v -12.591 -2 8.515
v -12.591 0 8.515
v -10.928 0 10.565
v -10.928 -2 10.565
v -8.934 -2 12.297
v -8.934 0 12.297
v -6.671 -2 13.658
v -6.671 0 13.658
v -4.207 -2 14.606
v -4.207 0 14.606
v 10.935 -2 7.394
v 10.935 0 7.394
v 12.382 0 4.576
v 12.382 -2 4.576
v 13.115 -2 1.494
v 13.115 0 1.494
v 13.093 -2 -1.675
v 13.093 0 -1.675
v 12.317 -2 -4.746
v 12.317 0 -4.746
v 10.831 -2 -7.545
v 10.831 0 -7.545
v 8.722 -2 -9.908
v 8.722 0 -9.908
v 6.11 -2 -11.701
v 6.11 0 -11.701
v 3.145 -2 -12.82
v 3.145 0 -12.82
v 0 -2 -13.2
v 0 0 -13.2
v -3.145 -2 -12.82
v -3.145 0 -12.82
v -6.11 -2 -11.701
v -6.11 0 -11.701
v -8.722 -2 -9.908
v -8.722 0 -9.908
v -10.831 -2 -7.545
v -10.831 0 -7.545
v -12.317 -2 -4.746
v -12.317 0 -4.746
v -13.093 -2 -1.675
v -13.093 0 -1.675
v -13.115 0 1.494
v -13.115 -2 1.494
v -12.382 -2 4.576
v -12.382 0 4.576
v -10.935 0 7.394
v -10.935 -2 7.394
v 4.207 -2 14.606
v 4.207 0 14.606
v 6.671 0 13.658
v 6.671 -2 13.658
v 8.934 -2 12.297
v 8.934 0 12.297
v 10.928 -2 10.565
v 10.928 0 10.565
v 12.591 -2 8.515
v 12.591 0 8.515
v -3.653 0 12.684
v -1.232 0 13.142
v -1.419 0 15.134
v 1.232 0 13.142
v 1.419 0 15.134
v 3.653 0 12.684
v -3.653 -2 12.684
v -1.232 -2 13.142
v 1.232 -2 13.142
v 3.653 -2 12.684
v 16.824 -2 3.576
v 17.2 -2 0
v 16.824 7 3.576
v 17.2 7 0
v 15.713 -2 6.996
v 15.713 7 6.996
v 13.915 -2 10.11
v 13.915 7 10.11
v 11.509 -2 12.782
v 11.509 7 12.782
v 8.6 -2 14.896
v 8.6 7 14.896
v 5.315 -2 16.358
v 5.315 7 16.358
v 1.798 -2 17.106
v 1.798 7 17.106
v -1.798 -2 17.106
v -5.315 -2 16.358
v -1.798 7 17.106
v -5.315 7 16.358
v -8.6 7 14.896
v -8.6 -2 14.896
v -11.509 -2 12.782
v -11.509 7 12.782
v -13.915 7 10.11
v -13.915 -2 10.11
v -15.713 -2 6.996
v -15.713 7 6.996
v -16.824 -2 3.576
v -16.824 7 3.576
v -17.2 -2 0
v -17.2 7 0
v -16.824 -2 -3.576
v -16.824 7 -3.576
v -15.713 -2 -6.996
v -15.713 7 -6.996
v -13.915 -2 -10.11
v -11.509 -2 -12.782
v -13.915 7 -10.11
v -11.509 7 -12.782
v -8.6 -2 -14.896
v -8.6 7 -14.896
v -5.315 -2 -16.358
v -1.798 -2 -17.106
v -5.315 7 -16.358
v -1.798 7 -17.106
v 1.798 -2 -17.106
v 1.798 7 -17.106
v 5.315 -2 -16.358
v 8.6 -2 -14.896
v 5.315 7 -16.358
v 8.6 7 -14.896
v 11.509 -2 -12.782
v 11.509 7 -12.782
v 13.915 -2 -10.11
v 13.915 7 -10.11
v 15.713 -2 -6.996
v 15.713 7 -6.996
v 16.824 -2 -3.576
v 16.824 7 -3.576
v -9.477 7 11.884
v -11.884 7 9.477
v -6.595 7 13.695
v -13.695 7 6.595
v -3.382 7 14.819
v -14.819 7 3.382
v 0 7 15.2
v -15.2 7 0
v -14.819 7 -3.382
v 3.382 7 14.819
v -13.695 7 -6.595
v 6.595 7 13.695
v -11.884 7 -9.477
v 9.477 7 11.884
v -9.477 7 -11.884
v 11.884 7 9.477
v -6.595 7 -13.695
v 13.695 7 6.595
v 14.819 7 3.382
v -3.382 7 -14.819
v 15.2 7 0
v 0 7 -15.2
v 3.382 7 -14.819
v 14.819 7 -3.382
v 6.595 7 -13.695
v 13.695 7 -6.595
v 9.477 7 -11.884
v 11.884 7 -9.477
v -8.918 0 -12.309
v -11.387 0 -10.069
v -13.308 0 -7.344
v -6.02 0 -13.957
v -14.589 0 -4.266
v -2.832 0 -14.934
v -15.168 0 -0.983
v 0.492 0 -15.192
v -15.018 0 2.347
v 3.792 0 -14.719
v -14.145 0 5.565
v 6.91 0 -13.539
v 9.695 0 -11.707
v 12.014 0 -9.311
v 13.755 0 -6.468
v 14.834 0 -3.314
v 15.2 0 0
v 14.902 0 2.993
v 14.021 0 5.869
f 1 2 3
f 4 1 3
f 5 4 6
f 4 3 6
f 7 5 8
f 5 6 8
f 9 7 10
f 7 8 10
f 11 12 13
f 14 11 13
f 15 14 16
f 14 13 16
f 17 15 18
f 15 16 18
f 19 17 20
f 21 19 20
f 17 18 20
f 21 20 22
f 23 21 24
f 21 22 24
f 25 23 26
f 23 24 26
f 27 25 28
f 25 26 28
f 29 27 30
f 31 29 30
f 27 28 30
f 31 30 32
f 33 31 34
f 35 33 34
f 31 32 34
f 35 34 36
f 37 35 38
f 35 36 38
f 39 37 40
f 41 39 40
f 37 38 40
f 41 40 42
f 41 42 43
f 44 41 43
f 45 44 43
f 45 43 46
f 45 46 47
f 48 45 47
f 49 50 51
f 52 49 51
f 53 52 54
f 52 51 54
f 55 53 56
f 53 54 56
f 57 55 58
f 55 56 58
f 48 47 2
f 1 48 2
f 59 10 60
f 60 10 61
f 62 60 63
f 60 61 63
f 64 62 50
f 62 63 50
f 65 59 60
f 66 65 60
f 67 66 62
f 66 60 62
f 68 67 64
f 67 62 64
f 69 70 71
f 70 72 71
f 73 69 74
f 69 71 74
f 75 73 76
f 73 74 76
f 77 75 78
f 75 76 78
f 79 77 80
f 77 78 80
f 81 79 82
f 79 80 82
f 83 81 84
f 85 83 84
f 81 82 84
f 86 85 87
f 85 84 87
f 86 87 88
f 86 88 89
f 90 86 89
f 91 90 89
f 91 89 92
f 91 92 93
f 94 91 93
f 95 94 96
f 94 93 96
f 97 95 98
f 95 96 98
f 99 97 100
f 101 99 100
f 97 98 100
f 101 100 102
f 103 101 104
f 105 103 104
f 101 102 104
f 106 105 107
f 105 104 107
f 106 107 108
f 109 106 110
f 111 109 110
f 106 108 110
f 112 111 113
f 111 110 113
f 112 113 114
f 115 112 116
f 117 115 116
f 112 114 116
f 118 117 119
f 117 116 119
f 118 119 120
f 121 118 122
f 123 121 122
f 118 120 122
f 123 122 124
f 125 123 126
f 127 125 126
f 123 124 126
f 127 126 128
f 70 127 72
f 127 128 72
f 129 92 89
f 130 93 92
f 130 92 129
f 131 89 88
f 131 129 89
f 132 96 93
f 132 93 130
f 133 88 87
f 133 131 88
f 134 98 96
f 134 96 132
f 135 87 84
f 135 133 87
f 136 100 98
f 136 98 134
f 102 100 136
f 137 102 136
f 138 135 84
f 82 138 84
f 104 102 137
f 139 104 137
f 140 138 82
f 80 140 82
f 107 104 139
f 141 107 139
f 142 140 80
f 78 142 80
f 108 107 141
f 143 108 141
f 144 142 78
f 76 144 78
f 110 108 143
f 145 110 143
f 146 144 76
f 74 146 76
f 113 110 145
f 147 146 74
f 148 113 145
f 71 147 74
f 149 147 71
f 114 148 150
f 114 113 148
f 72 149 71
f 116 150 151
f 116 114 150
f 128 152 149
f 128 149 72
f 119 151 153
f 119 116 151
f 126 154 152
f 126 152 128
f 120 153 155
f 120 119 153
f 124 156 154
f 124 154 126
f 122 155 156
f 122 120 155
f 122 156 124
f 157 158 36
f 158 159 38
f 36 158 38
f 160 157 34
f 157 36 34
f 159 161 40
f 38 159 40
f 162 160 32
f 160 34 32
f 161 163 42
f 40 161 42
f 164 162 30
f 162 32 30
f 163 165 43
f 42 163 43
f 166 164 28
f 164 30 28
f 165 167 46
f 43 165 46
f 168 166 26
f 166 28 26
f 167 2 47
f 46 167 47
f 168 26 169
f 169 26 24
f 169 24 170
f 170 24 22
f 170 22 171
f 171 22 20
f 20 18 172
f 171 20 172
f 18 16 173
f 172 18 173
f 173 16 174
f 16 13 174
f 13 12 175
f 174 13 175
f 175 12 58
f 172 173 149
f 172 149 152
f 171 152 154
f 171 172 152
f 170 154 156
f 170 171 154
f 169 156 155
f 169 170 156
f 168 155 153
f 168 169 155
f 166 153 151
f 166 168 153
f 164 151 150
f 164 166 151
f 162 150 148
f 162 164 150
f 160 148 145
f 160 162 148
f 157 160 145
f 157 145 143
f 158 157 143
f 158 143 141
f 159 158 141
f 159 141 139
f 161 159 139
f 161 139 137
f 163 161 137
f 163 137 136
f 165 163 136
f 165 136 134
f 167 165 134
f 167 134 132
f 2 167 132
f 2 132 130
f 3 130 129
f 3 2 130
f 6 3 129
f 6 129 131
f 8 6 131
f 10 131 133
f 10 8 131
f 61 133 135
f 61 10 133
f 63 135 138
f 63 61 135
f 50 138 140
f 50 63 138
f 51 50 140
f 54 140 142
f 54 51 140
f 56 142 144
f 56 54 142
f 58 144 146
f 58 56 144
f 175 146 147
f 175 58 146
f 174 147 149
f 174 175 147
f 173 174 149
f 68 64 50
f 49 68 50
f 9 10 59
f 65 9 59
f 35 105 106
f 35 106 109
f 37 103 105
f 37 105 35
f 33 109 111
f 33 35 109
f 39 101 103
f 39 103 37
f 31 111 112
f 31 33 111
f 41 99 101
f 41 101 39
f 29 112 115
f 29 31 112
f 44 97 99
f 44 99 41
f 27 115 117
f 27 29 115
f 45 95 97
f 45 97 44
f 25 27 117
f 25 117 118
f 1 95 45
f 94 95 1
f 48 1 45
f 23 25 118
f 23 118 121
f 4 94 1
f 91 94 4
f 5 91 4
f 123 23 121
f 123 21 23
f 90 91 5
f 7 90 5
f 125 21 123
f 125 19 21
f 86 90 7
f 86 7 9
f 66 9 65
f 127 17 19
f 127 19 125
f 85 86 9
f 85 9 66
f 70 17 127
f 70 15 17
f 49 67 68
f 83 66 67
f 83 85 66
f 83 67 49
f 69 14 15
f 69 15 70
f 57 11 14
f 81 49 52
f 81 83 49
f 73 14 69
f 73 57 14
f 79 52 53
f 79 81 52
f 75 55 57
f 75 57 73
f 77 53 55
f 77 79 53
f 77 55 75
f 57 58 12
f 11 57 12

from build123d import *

# Parameters (mm, degrees)
SKETCH1_R           = 17.2
SKETCH1_R_2         = 15.2
BOSS_EXTRUDE1_DEPTH = 7
BOSS_EXTRUDE2_START = 2
SKETCH2_R           = 17.2
BOSS_EXTRUDE2_DEPTH = 2


with BuildPart() as part:
    # Sketch1 → Boss-Extrude1 (new body)
    with BuildSketch(Plane(origin=(0, 0, 0), x_dir=(1, 0, 0), z_dir=(0, 1, 0))):
        Circle(SKETCH1_R)
        Circle(SKETCH1_R_2, mode=Mode.SUBTRACT)
    extrude(amount=BOSS_EXTRUDE1_DEPTH)

    # Sketch2 → Boss-Extrude2 (add)
    with BuildSketch(Plane.XZ.offset(BOSS_EXTRUDE2_START)):
        Circle(SKETCH2_R)
        with BuildLine():
            Line((-10.9345628, 7.394277271), (-12.59131474, 8.514622313))
            ThreePointArc((-12.59131474, 8.514622313), (-8.934335835, 12.297058314), (-4.206956798, 14.606214927))
            Line((-4.206956798, 14.606214927), (-3.653409851, 12.684344542))
            ThreePointArc((-3.653409851, 12.684344542), (0, 13.2), (3.653409851, 12.684344542))
            Line((3.653409851, 12.684344542), (4.206956798, 14.606214927))
            ThreePointArc((4.206956798, 14.606214927), (8.934335835, 12.297058314), (12.59131474, 8.514622313))
            Line((12.59131474, 8.514622313), (10.9345628, 7.394277271))
            ThreePointArc((10.9345628, 7.394277271), (0, -13.2), (-10.9345628, 7.394277271))
        make_face(mode=Mode.SUBTRACT)
    extrude(amount=-BOSS_EXTRUDE2_DEPTH)


solid = part.part
